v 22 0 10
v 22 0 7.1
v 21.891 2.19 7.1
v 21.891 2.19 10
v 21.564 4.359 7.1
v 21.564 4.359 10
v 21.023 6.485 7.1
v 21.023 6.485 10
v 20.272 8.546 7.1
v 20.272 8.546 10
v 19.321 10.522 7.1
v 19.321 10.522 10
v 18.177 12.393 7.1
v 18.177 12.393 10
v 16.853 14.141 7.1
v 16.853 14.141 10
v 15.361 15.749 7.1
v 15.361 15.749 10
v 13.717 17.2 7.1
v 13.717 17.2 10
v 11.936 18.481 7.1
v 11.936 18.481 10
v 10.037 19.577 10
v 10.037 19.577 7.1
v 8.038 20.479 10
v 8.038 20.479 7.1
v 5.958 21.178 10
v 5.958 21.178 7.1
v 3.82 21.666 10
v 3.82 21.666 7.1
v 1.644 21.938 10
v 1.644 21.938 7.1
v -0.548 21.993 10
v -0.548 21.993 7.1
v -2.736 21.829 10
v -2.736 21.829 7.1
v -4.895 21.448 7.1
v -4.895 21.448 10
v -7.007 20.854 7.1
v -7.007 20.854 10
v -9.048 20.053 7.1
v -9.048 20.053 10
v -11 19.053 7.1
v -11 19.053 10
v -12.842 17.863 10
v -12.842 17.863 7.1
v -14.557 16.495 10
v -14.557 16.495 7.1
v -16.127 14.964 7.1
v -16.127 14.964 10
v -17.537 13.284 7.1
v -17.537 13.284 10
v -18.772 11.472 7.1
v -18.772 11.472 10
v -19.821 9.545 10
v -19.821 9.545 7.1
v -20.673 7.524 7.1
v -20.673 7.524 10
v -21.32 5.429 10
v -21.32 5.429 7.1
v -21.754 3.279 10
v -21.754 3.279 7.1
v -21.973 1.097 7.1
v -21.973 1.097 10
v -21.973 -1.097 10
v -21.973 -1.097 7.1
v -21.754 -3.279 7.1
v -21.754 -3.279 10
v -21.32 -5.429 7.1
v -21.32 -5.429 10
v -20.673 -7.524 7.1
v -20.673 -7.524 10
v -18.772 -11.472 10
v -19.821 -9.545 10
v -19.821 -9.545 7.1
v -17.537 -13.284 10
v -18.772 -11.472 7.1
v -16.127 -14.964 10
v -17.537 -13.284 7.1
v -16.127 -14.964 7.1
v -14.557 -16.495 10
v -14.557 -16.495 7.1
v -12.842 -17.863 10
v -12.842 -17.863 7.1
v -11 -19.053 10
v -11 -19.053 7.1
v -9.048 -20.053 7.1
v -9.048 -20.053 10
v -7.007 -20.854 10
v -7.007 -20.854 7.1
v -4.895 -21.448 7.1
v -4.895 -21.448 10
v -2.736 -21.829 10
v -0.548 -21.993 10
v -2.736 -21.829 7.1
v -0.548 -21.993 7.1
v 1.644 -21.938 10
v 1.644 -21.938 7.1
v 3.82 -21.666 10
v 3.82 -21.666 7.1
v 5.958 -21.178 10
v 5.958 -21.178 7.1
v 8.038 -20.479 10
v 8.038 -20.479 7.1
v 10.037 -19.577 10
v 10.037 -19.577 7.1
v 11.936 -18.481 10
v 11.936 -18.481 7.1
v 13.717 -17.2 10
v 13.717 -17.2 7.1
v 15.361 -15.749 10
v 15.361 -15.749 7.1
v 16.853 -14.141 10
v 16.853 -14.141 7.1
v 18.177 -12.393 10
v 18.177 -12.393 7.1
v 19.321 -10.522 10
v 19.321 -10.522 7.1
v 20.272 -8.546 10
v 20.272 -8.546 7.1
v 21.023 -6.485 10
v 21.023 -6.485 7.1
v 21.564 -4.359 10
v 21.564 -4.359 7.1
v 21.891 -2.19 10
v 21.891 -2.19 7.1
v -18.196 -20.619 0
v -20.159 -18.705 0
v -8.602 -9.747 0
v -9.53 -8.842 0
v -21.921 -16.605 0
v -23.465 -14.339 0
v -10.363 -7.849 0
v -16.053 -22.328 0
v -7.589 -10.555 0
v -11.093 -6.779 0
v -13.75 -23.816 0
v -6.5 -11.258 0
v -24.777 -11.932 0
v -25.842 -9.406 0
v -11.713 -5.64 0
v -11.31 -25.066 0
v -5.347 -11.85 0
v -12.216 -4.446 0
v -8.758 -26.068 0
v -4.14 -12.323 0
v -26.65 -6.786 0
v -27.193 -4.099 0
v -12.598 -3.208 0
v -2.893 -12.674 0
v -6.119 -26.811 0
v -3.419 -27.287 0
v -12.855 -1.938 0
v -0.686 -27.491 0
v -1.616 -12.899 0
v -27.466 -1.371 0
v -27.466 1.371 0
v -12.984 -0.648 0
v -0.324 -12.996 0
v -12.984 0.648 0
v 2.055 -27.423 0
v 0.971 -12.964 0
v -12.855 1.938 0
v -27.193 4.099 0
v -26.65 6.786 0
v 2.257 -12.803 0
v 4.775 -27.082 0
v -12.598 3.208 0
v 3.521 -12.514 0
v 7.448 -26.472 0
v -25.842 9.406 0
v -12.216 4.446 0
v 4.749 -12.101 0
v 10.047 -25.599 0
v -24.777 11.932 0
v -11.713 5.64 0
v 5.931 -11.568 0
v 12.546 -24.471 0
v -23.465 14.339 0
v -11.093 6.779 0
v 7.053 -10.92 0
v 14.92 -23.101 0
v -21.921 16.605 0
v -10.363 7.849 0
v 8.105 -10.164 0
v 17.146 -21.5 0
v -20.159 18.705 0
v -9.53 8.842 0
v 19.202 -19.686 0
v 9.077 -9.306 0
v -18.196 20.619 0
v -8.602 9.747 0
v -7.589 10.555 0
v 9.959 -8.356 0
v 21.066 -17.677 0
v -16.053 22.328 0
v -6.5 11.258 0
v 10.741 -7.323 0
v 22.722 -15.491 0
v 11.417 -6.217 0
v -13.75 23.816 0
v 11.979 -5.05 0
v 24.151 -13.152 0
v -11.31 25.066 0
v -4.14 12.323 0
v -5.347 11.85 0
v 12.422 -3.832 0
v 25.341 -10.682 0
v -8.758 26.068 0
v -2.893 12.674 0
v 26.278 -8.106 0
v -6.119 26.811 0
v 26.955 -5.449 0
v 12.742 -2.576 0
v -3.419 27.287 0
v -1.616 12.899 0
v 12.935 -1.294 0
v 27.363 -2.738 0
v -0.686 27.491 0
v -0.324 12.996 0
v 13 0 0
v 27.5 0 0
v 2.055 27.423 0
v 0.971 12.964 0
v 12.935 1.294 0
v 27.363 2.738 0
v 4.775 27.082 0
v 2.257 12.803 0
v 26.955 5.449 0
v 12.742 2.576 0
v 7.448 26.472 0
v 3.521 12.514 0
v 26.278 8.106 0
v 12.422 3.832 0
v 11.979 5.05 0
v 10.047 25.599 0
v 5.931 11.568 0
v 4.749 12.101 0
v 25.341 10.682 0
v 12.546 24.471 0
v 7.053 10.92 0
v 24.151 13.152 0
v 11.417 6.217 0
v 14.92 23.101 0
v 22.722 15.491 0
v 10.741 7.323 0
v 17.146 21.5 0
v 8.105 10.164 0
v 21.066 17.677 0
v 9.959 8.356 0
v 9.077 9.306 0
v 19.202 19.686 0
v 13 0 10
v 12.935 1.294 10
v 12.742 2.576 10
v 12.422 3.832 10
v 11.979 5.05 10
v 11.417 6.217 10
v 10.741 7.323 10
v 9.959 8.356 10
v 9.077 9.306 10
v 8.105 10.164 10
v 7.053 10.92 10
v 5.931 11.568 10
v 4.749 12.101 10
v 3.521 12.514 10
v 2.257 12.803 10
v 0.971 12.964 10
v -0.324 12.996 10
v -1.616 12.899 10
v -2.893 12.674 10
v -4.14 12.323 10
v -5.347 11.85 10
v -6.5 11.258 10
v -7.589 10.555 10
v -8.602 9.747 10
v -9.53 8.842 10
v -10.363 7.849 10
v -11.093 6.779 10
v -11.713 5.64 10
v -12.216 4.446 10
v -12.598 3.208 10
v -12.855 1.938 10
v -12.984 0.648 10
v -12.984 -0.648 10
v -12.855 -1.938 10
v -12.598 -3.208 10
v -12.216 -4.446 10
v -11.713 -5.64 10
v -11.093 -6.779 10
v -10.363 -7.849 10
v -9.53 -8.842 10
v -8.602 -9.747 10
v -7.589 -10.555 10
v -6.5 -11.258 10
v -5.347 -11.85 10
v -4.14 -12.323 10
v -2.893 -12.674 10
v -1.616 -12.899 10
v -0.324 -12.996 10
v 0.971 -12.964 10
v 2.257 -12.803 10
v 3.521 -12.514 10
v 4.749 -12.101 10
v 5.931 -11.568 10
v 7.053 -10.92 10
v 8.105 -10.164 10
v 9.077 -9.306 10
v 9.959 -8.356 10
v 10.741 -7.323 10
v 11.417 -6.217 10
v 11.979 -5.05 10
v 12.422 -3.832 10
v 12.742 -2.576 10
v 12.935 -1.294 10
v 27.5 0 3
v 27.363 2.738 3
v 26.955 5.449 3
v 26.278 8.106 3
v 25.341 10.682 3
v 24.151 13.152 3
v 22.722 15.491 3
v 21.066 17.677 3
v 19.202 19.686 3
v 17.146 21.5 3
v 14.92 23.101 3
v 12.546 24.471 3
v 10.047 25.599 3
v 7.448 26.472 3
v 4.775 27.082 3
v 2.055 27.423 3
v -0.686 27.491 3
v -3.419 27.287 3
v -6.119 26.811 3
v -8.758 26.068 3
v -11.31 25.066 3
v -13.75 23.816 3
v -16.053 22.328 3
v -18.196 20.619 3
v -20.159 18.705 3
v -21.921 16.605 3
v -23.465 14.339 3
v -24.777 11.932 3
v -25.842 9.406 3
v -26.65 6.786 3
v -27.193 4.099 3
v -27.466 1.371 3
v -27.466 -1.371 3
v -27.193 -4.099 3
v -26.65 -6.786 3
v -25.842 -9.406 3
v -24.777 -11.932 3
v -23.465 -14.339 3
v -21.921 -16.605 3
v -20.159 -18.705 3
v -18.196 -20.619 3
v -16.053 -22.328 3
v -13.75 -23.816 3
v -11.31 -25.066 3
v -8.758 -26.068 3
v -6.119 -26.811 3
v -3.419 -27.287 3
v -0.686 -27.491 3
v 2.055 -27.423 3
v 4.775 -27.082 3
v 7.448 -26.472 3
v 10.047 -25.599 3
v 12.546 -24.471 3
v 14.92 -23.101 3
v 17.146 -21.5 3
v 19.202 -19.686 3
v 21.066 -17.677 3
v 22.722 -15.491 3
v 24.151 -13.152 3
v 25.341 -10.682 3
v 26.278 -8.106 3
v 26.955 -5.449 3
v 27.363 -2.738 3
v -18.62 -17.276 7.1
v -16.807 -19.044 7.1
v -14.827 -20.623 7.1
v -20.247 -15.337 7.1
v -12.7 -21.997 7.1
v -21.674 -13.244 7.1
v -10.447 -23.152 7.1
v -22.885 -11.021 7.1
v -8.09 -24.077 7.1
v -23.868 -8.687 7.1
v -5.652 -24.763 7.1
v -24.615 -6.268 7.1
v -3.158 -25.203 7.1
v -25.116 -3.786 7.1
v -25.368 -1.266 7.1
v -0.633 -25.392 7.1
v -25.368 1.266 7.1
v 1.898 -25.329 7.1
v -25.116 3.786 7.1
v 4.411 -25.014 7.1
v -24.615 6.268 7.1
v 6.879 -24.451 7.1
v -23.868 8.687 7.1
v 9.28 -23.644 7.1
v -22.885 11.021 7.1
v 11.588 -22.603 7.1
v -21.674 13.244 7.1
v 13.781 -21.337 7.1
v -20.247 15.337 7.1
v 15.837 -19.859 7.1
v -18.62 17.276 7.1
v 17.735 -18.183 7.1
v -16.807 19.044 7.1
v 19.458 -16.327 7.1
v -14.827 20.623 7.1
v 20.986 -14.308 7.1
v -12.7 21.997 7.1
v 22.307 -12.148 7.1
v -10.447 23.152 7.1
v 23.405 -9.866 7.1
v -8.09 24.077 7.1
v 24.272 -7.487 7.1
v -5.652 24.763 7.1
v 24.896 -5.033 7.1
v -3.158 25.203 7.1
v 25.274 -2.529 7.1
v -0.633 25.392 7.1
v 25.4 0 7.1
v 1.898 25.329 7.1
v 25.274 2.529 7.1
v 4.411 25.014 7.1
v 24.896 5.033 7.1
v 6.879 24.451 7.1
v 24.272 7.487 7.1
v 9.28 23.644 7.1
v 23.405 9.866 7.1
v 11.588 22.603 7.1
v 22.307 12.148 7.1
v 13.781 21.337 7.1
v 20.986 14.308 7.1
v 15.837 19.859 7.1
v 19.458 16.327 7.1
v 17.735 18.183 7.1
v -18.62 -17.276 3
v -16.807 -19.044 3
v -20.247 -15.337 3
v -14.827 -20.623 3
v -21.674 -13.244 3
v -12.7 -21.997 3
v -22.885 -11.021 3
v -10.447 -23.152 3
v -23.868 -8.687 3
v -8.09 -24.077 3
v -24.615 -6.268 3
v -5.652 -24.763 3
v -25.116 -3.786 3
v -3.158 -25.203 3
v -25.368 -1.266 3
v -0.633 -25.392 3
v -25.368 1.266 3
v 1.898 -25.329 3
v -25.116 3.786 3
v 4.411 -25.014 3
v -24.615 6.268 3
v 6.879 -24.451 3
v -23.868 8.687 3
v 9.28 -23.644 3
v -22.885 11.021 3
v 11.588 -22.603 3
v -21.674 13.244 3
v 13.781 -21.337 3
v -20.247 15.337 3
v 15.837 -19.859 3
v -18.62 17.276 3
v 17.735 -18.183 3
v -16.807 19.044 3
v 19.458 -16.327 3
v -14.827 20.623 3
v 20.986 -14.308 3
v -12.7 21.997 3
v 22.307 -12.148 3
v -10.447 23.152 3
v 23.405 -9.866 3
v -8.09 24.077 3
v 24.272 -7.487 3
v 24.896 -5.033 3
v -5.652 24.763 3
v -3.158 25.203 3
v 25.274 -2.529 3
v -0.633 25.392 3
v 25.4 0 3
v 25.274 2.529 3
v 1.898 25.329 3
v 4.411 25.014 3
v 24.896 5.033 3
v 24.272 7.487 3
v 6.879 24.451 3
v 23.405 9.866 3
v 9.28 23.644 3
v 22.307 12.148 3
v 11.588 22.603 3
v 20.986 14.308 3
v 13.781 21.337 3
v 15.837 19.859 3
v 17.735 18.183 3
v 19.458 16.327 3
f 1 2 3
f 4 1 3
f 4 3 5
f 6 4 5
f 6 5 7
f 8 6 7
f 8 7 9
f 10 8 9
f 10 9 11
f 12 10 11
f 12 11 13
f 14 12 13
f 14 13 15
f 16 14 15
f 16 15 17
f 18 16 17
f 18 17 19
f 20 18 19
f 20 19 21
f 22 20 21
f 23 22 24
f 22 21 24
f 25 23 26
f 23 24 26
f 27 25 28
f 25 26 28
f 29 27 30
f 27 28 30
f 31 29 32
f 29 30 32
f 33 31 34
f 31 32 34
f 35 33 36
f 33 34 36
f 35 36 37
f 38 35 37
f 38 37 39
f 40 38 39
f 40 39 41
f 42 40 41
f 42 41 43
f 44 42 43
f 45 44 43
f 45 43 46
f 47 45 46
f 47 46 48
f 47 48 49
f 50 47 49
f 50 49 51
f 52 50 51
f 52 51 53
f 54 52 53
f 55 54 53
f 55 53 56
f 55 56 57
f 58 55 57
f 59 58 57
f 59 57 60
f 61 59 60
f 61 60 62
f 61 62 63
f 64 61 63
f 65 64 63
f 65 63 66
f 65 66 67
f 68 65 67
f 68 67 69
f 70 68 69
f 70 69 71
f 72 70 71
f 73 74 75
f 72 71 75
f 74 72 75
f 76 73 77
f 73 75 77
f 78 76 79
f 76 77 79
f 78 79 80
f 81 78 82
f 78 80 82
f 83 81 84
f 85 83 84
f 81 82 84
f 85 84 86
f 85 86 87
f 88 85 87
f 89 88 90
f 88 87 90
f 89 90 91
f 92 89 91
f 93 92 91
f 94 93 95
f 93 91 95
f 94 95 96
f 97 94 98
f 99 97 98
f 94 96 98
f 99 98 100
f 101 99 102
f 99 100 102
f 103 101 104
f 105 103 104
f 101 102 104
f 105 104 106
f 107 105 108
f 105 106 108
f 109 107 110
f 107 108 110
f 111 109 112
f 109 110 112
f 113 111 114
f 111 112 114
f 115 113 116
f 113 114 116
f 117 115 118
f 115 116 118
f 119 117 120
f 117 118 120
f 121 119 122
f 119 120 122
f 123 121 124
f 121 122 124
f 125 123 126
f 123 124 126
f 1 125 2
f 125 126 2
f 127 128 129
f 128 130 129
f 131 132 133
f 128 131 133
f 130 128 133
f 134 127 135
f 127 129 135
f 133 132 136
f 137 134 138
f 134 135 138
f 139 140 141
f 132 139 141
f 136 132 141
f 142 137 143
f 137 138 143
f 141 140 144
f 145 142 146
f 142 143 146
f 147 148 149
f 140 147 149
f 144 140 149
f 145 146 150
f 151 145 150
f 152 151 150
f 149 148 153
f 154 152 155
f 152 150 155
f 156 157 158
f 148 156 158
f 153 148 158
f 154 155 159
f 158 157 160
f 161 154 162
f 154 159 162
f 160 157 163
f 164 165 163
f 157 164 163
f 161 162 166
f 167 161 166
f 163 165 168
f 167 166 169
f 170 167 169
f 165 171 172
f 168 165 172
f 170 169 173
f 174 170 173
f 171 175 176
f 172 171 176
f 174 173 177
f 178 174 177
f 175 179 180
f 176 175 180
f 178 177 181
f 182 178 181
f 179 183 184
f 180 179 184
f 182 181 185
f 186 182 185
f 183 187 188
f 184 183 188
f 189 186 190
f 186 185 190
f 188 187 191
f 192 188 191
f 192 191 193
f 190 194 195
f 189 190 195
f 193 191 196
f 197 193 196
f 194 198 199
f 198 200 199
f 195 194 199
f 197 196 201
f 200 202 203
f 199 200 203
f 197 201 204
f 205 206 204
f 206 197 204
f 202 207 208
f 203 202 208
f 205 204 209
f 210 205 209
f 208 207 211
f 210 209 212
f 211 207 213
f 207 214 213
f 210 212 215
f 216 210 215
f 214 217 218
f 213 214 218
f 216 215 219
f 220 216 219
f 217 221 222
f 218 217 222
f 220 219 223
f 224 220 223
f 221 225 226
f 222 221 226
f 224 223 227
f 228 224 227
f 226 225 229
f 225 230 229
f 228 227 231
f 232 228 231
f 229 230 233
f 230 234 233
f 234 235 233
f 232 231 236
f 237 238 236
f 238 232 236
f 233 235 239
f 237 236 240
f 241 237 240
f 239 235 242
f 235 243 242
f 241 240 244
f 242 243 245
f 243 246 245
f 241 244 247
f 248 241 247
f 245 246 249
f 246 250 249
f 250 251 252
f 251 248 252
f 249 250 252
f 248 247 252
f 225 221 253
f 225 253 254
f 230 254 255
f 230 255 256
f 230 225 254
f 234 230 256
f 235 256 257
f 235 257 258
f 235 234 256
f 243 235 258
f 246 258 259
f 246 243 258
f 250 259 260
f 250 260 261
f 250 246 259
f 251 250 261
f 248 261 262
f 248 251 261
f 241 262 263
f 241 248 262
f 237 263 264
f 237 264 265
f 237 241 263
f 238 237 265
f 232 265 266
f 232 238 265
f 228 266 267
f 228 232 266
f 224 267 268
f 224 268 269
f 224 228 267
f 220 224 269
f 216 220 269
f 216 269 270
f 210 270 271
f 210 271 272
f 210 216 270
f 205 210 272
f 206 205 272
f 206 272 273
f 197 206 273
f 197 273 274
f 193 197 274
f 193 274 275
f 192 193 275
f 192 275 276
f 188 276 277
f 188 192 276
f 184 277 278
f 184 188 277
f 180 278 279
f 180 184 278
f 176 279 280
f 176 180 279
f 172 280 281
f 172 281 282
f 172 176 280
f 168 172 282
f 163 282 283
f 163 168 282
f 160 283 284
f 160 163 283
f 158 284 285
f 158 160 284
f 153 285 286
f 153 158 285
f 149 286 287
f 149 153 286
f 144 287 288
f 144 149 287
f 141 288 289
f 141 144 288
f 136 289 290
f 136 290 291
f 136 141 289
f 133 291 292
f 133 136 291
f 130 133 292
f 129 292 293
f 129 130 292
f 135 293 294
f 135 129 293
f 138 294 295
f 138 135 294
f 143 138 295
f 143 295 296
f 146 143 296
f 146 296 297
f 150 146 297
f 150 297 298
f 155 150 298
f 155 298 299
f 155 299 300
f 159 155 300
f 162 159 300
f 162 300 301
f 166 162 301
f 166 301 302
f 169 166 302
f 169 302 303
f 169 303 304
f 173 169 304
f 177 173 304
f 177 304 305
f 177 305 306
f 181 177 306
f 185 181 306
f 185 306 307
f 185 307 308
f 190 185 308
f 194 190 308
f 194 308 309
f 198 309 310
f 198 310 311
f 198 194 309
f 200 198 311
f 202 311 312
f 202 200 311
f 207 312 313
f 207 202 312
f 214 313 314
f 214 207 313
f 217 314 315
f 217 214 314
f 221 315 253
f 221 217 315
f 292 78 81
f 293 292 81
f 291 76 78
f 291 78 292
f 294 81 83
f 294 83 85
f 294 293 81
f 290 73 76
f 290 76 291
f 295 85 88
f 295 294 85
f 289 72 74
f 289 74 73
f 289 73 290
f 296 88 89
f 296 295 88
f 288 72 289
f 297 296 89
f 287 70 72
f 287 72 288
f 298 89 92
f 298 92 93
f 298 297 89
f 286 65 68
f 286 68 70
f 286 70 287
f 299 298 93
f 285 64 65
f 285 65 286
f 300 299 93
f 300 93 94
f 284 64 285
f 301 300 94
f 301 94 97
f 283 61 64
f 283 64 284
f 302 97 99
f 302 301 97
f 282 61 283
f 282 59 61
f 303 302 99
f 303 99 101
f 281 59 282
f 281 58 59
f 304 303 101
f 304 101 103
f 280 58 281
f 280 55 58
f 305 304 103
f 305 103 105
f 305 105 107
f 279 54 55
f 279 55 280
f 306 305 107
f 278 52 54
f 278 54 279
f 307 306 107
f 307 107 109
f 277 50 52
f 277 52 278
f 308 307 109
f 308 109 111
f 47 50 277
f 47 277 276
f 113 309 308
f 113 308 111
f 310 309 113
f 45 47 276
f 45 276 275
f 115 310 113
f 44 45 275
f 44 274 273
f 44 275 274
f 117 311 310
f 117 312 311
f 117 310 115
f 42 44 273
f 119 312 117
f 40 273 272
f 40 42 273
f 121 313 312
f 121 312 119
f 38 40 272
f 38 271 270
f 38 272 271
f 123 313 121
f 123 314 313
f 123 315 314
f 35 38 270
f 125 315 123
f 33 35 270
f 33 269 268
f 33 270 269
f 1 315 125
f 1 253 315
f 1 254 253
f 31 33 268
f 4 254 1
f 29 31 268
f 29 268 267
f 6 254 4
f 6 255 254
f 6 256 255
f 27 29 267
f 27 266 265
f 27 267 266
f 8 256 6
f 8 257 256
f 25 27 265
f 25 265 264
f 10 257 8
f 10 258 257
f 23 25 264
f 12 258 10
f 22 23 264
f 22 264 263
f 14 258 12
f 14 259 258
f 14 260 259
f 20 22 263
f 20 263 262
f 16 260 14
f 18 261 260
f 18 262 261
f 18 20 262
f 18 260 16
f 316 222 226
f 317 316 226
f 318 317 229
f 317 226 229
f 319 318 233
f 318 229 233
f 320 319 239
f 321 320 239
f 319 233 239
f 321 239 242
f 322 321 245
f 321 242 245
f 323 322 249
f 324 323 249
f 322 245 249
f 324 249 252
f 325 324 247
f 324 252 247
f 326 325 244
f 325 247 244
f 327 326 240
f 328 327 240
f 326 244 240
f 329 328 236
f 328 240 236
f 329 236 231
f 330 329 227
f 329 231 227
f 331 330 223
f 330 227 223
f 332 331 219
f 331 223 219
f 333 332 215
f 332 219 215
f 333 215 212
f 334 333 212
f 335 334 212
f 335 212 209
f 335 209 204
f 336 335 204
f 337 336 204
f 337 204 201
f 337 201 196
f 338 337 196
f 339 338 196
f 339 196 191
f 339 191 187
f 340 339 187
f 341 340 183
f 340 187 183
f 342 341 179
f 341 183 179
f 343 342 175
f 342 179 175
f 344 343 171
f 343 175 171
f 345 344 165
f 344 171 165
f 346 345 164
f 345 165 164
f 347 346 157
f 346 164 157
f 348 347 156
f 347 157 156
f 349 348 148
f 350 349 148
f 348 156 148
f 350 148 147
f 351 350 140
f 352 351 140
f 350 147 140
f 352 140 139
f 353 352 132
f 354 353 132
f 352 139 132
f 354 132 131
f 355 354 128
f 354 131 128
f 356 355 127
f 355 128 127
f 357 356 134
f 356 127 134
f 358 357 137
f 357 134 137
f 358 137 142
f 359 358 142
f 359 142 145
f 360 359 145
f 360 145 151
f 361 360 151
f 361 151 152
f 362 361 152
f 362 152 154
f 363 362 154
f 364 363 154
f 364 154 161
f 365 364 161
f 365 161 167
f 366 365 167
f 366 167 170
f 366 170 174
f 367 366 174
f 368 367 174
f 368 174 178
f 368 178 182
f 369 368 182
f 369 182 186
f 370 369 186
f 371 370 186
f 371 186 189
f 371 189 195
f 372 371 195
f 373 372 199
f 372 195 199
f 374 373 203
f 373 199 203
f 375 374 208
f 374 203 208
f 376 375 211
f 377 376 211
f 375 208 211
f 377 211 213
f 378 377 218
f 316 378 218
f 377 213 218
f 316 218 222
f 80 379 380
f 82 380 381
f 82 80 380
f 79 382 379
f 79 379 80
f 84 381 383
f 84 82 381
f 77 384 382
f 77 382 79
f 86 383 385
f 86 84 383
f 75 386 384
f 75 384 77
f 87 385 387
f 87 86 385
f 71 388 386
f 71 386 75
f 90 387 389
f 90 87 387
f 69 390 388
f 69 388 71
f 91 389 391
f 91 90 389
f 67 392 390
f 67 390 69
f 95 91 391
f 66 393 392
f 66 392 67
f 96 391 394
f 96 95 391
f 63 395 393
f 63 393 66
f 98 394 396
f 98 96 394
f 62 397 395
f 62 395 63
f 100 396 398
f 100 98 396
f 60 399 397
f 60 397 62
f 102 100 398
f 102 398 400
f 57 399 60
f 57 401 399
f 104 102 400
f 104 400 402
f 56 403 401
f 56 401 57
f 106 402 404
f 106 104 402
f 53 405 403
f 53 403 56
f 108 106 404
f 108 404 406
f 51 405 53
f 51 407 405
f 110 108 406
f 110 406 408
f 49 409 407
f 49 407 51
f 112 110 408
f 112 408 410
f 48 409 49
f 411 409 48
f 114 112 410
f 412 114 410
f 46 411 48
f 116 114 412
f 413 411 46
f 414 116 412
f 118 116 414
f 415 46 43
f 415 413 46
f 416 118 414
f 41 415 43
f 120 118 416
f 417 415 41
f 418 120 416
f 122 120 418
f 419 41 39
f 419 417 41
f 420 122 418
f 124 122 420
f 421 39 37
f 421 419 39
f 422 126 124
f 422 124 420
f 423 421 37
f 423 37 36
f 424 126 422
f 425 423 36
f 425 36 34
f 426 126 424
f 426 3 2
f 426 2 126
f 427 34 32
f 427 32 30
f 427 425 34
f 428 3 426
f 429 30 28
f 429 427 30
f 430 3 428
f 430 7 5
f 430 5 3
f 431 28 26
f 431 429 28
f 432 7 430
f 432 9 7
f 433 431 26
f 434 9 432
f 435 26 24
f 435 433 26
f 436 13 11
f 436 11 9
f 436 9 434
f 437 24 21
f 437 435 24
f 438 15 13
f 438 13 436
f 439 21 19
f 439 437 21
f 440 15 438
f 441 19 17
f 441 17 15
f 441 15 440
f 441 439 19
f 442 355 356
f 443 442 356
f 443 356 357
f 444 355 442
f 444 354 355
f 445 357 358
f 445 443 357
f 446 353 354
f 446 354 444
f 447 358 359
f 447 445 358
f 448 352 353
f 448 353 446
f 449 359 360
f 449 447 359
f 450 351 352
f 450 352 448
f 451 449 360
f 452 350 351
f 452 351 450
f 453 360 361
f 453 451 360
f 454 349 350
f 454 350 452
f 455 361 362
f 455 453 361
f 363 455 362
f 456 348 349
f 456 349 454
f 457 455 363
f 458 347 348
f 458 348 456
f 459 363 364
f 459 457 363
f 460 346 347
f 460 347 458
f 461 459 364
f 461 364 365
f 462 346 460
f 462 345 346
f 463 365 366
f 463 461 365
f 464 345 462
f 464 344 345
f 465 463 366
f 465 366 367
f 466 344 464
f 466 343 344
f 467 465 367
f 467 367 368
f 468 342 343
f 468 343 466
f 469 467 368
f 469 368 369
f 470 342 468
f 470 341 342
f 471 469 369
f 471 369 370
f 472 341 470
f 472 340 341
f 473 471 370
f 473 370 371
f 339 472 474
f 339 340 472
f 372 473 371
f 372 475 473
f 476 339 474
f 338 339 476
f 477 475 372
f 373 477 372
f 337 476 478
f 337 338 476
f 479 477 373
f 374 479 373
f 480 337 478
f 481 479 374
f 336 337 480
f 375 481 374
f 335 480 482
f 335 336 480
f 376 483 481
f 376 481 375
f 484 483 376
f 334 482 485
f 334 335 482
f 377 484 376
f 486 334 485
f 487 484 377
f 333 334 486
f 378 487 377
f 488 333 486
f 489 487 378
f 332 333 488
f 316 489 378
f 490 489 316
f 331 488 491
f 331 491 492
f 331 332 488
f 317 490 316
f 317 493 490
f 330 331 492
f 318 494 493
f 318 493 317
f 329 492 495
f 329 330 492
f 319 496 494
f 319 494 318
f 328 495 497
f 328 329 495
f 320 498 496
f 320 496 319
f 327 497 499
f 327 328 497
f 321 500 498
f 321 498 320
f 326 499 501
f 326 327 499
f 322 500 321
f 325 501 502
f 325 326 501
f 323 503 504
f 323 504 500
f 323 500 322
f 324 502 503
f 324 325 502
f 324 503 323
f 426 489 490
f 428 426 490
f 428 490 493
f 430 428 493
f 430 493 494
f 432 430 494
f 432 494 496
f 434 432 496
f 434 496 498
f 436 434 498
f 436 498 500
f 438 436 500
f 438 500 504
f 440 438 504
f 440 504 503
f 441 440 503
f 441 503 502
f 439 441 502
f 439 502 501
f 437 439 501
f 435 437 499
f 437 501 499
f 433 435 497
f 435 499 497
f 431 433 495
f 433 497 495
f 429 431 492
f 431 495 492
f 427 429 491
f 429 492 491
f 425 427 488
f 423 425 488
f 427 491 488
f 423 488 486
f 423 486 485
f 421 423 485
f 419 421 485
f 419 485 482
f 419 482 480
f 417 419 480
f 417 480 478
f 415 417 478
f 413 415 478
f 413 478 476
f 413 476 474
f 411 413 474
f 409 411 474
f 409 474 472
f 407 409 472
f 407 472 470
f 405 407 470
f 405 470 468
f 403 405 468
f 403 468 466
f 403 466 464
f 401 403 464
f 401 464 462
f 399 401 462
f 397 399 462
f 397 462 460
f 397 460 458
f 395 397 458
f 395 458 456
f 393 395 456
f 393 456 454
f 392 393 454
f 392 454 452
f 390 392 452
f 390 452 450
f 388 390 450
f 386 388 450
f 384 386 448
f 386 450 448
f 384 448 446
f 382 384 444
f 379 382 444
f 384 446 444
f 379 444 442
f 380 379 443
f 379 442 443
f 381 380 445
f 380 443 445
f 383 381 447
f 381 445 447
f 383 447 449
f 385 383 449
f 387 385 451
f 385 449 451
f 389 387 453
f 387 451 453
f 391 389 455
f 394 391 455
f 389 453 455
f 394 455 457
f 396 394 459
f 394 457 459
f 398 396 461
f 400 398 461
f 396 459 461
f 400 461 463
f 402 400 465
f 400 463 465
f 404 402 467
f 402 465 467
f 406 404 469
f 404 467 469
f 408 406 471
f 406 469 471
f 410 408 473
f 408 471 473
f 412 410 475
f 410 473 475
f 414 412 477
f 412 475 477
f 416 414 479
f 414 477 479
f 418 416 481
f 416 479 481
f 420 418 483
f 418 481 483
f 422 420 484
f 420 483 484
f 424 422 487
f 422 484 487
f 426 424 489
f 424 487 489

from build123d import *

# Parameters (mm, degrees)
SKETCH_1_R          = 27.5
EXTRUDE_1_DEPTH     = 3
SKETCH_1_3_R        = 25.4
EXTRUDE_2_DEPTH     = 7.1
SKETCH_1_4_R        = 22
EXTRUDE_3_DEPTH     = 10
SKETCH_1_5_R        = 13
CUT_EXTRUDE_1_DEPTH = 10


with BuildPart() as part:
    # 草图1 → 凸台-拉伸1 (new body)
    with BuildSketch(Plane.XY):
        Circle(SKETCH_1_R)
    extrude(amount=EXTRUDE_1_DEPTH)

    # 草图1<3> → 凸台-拉伸2 (add)
    with BuildSketch(Plane.XY):
        Circle(SKETCH_1_3_R)
    extrude(amount=EXTRUDE_2_DEPTH)

    # 草图1<4> → 凸台-拉伸3 (add)
    with BuildSketch(Plane.XY):
        Circle(SKETCH_1_4_R)
    extrude(amount=EXTRUDE_3_DEPTH)

    # 草图1<5> → 切除-拉伸1 (cut)
    with BuildSketch(Plane.XY):
        Circle(SKETCH_1_5_R)
    extrude(amount=CUT_EXTRUDE_1_DEPTH, mode=Mode.SUBTRACT)


solid = part.part
